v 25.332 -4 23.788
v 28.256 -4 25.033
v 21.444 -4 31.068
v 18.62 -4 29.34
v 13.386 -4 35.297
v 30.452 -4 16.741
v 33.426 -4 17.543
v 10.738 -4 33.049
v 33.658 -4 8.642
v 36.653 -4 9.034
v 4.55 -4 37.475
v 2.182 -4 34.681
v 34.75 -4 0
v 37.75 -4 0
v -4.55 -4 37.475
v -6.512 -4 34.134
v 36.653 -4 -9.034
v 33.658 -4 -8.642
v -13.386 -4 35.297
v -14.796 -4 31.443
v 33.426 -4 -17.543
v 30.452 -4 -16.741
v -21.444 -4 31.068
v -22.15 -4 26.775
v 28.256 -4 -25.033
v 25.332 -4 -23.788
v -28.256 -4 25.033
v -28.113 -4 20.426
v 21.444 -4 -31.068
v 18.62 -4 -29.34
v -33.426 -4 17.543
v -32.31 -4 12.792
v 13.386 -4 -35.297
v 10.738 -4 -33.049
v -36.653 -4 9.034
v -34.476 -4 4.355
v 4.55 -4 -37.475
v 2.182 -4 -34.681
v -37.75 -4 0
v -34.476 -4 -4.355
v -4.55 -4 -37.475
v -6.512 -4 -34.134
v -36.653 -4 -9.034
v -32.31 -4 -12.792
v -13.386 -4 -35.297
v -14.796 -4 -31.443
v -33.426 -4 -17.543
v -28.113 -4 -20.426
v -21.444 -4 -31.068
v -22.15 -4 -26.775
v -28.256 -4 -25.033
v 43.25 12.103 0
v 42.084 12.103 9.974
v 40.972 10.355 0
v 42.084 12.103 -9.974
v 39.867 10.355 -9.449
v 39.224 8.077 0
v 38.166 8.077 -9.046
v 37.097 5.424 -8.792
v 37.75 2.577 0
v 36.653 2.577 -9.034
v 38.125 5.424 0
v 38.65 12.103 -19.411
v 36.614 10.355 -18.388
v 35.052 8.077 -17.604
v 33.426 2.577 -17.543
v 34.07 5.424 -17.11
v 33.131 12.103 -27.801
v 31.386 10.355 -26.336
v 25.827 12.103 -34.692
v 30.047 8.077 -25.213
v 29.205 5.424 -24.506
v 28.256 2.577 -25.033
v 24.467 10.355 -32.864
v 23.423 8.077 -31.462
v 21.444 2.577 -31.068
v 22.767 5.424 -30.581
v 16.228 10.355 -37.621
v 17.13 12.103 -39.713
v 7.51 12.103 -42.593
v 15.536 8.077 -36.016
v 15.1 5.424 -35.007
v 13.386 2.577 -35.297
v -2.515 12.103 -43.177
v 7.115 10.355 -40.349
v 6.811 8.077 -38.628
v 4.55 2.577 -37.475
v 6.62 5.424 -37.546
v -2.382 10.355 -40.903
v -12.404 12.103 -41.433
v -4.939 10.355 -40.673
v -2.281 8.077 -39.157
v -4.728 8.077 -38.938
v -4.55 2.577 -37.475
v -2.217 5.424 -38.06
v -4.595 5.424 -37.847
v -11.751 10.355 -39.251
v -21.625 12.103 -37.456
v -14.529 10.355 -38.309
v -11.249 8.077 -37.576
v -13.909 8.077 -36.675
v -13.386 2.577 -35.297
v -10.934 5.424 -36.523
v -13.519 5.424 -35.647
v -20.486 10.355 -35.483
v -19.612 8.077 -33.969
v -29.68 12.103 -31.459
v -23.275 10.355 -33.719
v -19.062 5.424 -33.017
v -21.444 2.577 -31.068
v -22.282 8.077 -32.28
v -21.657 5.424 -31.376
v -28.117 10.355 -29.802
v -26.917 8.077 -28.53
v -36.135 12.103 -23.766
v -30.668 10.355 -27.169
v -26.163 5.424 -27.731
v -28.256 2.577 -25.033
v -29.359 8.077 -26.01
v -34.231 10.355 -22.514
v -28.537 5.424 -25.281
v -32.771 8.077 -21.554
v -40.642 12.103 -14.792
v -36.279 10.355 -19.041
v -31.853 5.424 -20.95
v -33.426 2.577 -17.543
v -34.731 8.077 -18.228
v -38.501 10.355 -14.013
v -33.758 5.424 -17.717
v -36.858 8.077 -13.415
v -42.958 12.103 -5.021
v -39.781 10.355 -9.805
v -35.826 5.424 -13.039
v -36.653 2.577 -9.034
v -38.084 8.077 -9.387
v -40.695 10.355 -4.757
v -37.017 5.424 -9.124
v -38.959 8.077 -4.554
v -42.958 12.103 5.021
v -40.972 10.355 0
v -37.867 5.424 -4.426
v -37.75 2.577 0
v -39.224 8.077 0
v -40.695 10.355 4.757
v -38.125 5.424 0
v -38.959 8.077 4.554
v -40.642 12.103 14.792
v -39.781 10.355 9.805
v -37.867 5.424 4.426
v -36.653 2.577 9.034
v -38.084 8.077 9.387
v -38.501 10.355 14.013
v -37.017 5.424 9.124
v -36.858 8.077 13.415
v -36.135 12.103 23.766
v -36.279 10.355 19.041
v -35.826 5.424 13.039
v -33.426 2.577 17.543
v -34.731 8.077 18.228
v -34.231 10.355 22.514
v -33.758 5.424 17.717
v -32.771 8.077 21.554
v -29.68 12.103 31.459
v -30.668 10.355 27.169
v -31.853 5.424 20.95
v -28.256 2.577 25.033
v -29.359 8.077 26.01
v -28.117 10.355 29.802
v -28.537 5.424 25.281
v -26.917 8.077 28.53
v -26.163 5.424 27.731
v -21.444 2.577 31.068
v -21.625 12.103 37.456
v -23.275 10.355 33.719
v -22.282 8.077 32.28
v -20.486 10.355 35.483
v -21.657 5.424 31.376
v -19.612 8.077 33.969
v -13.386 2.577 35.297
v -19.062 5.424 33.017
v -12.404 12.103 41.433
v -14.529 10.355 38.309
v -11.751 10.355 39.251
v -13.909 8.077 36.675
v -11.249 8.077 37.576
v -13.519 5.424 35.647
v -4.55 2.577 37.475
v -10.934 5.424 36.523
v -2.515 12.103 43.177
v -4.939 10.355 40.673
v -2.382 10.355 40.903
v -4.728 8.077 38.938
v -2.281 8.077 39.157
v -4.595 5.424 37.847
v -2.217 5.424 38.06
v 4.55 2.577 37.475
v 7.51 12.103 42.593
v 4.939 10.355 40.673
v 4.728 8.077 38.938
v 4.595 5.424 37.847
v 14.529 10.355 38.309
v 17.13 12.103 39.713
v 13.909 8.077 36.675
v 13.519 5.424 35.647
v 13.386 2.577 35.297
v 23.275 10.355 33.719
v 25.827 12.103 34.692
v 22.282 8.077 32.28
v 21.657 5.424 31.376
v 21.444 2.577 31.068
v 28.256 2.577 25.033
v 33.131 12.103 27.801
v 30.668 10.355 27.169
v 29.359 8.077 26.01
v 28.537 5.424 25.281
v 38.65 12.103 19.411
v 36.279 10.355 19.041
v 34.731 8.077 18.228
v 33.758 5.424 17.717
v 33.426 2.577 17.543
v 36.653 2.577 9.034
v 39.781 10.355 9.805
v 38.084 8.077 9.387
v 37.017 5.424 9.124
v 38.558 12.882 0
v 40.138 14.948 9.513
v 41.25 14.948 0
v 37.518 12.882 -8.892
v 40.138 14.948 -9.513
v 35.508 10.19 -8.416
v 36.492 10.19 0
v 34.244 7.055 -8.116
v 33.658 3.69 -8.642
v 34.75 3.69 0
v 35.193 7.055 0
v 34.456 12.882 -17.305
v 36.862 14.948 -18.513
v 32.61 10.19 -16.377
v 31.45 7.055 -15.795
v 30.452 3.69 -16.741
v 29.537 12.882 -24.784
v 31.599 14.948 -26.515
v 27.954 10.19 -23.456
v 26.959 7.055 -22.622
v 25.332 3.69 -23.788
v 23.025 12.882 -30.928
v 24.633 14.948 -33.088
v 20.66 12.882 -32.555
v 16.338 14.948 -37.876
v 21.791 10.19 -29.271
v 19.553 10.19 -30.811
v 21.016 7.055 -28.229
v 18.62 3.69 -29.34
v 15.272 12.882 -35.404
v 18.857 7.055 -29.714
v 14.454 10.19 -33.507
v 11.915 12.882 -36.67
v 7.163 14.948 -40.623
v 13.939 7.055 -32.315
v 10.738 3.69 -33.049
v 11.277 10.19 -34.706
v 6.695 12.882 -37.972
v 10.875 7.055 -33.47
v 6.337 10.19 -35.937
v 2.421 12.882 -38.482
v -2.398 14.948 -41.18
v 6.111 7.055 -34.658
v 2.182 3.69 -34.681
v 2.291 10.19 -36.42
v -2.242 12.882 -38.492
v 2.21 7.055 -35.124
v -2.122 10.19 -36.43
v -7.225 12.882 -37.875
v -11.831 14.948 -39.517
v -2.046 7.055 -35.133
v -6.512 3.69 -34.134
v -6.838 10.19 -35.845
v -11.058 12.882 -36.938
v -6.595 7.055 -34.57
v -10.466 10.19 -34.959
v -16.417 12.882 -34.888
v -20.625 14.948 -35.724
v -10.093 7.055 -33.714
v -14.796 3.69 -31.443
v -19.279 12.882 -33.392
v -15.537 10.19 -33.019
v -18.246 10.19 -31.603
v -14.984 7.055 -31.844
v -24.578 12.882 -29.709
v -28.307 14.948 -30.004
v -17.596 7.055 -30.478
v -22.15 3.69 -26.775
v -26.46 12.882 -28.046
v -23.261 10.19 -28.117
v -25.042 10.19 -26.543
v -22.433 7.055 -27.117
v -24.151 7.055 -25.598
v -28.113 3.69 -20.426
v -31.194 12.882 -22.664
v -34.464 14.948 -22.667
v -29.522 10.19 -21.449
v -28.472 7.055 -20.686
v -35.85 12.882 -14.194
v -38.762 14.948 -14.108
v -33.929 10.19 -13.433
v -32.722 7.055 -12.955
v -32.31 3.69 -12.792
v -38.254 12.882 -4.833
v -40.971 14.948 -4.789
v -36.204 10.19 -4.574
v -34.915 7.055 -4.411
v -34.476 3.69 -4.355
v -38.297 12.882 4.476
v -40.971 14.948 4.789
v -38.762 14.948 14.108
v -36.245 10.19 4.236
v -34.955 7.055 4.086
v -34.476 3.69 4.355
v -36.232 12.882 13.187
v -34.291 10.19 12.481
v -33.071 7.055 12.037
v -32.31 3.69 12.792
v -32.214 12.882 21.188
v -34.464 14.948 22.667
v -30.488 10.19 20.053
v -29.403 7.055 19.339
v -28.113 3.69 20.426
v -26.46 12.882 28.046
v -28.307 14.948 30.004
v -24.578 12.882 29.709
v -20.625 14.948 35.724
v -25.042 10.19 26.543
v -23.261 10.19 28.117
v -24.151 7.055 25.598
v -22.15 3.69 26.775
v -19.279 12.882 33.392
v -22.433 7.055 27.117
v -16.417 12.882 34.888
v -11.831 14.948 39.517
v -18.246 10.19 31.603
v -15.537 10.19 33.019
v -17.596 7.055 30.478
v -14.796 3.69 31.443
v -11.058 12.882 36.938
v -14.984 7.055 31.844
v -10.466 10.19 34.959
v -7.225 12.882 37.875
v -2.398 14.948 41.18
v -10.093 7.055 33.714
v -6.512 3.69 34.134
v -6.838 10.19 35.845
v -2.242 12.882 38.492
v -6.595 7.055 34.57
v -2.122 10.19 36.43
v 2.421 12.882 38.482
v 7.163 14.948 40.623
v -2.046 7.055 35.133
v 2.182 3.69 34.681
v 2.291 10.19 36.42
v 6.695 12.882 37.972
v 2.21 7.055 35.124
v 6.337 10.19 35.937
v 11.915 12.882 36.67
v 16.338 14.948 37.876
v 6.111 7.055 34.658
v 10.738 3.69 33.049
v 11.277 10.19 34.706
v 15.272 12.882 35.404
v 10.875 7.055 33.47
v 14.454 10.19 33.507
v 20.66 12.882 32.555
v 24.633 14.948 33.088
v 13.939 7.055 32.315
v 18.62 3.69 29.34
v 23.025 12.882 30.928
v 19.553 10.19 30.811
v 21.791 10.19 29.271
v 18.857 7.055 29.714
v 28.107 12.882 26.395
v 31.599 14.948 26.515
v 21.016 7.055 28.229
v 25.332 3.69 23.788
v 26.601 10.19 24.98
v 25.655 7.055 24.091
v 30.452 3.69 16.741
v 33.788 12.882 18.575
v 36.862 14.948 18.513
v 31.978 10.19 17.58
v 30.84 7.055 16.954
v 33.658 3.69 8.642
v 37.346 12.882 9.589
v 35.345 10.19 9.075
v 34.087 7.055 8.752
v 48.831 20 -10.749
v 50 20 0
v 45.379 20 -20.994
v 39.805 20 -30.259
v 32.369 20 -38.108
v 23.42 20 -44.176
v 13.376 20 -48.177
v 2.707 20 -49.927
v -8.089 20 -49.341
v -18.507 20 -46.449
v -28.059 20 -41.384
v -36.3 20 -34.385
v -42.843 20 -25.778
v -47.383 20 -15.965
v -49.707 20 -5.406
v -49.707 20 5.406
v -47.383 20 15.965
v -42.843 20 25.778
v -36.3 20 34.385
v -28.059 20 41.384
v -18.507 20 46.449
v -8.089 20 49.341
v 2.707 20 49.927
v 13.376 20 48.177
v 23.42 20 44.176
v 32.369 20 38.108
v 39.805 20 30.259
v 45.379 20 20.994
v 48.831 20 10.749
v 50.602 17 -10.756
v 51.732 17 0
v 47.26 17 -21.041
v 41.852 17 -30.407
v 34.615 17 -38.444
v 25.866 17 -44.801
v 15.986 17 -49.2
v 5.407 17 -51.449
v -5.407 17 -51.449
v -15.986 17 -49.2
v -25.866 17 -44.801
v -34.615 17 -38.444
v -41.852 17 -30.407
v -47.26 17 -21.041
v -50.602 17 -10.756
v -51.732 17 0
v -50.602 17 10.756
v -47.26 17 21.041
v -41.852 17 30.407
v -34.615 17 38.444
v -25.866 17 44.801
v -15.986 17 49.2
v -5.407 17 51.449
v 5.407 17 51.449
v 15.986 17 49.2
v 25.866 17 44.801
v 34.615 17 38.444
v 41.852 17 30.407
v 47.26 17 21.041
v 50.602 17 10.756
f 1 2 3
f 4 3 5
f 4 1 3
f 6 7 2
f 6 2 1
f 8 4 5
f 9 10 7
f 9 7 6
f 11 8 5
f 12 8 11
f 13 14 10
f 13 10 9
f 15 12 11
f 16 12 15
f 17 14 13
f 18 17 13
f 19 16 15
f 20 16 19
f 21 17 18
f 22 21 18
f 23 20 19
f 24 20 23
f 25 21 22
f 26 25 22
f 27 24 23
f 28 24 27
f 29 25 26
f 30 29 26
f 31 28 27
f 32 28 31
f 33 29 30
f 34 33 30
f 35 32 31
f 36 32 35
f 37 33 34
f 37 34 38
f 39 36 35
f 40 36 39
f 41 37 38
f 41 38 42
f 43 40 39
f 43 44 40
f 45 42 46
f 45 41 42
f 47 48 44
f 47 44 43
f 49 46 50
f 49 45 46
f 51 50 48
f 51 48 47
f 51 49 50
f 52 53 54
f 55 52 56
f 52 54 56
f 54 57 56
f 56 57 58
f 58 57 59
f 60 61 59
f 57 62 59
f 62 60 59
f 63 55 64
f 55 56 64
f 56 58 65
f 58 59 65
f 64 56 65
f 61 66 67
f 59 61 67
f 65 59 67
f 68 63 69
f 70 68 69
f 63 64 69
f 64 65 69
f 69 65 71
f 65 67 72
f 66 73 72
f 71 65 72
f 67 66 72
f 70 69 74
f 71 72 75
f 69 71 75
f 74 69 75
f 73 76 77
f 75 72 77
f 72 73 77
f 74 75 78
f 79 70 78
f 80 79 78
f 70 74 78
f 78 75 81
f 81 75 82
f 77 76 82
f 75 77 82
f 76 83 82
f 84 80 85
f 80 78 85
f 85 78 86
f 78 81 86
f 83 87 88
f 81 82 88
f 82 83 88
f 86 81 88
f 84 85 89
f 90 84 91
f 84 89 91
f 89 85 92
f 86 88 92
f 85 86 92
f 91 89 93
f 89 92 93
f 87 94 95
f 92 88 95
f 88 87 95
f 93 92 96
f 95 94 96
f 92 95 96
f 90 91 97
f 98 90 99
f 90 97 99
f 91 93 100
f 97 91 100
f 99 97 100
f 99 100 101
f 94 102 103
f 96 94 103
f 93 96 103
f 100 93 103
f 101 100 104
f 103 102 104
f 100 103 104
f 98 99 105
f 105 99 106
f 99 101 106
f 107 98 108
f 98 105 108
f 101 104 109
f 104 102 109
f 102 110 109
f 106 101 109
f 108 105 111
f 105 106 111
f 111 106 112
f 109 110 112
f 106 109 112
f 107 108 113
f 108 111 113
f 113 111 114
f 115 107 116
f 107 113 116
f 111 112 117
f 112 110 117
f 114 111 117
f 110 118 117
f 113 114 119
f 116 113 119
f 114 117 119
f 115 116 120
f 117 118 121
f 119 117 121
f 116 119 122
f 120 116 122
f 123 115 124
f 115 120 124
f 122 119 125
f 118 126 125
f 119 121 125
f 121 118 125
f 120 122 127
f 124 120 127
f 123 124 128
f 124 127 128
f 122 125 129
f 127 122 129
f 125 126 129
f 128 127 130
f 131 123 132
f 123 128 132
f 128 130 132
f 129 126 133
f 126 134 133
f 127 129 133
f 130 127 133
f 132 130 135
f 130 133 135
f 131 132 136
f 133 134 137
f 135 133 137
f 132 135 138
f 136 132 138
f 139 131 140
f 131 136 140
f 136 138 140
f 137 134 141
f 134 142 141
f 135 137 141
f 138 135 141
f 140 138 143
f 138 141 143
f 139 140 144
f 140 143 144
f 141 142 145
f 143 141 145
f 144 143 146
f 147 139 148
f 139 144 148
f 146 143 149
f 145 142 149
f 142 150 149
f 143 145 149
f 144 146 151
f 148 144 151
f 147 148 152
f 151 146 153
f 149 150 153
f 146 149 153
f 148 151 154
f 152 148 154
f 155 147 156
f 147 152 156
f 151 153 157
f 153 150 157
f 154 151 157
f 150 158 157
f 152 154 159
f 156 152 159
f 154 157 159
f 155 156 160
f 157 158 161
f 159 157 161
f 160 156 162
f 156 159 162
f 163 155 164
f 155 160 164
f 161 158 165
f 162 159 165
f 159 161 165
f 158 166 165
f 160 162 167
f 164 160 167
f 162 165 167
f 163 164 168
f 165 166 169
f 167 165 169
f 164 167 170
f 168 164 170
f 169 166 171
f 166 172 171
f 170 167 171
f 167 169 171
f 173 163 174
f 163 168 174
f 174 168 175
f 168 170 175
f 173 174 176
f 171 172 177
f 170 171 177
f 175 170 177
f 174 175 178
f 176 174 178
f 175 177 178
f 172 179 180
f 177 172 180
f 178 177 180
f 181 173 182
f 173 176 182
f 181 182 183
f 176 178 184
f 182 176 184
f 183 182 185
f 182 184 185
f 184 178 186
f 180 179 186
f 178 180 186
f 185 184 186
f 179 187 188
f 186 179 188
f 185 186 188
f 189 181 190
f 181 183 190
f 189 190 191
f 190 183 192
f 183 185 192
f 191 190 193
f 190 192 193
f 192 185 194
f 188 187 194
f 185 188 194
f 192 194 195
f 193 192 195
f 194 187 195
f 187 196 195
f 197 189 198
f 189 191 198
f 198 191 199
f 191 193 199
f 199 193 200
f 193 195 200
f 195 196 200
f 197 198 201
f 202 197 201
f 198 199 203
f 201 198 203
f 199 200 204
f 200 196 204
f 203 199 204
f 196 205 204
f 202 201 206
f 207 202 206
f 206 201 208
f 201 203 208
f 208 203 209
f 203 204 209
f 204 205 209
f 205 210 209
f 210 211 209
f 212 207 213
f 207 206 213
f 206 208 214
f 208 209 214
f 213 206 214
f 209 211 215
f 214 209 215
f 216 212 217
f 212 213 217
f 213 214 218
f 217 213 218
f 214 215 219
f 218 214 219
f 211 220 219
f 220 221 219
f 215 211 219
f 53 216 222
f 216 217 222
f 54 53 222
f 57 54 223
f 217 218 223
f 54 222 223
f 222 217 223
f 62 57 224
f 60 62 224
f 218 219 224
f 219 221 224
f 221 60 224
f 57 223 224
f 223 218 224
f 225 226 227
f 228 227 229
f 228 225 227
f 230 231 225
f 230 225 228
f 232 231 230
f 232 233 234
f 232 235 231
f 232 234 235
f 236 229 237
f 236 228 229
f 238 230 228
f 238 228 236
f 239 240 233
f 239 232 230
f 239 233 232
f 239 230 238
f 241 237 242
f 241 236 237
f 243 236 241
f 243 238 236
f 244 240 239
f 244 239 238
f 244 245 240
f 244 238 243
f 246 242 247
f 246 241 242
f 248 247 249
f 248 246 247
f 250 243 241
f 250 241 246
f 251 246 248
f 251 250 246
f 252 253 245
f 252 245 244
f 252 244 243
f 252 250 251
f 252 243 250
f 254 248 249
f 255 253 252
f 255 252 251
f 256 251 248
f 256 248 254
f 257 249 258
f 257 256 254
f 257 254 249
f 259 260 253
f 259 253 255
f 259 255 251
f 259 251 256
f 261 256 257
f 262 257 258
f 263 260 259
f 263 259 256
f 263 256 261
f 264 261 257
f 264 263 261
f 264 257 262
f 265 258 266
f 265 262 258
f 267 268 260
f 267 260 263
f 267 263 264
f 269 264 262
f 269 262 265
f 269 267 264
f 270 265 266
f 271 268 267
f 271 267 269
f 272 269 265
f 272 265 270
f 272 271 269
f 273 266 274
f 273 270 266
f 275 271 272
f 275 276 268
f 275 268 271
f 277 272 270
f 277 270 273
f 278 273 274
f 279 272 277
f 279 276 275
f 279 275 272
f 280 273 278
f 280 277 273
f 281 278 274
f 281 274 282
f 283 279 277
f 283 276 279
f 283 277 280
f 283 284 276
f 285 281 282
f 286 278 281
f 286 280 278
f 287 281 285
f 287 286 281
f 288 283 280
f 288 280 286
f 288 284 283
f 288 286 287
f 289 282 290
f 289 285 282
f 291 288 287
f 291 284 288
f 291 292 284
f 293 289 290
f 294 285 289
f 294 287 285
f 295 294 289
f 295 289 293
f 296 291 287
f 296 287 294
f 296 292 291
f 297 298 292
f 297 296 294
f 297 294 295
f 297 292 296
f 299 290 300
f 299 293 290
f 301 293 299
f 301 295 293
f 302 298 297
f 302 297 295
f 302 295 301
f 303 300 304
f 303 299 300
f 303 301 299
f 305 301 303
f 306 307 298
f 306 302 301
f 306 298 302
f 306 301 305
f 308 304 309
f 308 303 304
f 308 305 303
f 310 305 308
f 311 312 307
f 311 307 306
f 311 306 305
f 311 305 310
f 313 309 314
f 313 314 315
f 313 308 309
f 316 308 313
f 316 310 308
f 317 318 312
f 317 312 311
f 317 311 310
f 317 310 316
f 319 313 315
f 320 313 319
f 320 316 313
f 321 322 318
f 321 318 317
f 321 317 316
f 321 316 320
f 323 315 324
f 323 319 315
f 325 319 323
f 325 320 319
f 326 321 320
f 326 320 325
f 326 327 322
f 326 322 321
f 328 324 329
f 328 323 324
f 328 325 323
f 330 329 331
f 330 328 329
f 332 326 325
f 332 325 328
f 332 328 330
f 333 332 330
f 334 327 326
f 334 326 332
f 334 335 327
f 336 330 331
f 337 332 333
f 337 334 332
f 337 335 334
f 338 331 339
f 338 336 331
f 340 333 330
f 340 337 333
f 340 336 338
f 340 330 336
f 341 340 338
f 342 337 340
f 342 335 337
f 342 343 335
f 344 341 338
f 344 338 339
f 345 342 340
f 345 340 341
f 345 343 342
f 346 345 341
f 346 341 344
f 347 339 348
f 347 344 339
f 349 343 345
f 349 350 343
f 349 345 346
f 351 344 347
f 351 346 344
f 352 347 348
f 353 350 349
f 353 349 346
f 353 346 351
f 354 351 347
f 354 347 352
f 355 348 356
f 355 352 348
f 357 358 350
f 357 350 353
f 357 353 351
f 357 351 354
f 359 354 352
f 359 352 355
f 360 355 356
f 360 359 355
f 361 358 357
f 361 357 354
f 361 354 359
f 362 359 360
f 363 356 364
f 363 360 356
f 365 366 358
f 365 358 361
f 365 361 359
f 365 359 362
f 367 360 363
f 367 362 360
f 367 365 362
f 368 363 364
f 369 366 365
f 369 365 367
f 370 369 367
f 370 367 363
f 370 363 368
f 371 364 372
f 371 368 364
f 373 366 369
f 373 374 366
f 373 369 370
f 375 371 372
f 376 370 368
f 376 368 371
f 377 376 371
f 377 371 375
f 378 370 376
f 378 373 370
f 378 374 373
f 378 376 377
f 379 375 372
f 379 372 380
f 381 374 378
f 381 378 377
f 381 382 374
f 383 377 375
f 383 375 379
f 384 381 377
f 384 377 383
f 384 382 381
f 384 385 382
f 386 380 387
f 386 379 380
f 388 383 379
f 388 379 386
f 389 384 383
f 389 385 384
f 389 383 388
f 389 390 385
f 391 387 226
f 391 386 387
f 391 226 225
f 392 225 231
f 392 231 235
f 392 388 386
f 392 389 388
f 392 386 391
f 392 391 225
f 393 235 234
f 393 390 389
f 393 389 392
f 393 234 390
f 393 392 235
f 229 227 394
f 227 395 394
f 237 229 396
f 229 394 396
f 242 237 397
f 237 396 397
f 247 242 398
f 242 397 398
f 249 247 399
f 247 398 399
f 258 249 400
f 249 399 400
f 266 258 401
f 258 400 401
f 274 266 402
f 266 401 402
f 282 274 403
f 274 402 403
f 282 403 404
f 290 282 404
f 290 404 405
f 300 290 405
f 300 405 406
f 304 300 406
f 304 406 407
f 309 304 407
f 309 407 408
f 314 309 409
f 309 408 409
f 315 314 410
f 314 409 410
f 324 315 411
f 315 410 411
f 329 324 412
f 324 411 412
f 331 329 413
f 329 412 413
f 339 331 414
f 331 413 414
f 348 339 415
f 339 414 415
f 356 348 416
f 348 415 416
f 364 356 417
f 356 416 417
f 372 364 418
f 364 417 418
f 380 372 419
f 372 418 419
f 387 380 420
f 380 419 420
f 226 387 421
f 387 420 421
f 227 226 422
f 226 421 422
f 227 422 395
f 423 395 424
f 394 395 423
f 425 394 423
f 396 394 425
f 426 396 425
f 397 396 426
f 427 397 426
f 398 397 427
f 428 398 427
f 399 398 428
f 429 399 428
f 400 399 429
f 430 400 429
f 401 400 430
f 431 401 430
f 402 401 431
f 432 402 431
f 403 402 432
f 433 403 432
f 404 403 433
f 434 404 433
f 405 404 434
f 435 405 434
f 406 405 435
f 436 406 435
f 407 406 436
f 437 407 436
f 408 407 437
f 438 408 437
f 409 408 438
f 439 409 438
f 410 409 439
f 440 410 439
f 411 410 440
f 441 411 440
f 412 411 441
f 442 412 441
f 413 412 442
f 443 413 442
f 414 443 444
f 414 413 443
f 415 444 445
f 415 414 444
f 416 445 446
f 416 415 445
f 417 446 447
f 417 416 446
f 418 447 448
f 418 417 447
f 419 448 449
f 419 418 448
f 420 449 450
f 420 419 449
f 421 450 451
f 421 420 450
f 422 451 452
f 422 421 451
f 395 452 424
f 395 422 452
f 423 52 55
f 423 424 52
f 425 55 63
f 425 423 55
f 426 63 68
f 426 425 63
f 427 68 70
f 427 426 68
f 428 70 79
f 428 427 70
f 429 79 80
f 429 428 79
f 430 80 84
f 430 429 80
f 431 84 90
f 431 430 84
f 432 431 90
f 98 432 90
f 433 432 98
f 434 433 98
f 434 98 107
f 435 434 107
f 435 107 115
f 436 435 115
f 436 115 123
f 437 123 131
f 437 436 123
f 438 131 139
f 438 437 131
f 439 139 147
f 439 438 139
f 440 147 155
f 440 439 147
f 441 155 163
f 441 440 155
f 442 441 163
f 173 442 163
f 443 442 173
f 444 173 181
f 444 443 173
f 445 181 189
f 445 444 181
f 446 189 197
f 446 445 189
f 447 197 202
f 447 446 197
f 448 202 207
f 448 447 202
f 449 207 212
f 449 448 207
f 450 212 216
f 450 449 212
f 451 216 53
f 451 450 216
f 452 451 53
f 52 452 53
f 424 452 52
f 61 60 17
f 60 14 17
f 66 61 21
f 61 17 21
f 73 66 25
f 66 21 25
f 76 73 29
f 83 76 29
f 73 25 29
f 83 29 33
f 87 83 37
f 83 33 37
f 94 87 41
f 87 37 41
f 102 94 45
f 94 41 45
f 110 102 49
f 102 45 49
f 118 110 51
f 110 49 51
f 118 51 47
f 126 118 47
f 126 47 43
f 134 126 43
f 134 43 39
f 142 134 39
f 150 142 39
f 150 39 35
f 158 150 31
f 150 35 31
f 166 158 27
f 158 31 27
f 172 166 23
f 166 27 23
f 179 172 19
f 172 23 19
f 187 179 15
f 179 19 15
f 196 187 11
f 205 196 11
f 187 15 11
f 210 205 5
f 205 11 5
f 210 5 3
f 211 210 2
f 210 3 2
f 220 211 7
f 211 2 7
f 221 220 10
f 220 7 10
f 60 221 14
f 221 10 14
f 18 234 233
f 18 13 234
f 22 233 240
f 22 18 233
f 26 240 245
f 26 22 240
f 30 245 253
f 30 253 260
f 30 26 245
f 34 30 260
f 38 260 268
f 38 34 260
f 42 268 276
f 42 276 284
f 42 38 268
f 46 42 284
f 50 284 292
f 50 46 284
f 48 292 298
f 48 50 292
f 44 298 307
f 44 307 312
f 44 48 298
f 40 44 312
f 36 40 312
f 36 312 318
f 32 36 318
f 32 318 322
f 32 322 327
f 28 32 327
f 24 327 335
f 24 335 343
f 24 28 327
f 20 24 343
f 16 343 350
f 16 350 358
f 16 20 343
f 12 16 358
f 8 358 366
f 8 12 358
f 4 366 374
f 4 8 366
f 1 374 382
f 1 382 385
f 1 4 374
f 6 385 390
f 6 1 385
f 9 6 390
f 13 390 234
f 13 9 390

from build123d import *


with BuildPart() as part:
    # Sketch → Revolution (revolve)
    with BuildSketch(Plane.XY):
        with BuildLine():
            Line((43.25, 12.102886), (51.732051, 17))
            Line((51.732051, 17), (50, 20))
            Line((41.25, 14.948185), (50, 20))
            ThreePointArc((41.25, 14.948185), (36.49167, 10.189855), (34.75, 3.689855))
            Line((34.75, 3.689855), (34.75, -4))
            Line((34.75, -4), (37.75, -4))
            Line((37.75, 2.576606), (37.75, -4))
            ThreePointArc((43.25, 12.102886), (39.223721, 8.076606), (37.75, 2.576606))
        make_face()
    revolve(axis=Axis((0, 0, 0), (0, 1, 0)))


solid = part.part
